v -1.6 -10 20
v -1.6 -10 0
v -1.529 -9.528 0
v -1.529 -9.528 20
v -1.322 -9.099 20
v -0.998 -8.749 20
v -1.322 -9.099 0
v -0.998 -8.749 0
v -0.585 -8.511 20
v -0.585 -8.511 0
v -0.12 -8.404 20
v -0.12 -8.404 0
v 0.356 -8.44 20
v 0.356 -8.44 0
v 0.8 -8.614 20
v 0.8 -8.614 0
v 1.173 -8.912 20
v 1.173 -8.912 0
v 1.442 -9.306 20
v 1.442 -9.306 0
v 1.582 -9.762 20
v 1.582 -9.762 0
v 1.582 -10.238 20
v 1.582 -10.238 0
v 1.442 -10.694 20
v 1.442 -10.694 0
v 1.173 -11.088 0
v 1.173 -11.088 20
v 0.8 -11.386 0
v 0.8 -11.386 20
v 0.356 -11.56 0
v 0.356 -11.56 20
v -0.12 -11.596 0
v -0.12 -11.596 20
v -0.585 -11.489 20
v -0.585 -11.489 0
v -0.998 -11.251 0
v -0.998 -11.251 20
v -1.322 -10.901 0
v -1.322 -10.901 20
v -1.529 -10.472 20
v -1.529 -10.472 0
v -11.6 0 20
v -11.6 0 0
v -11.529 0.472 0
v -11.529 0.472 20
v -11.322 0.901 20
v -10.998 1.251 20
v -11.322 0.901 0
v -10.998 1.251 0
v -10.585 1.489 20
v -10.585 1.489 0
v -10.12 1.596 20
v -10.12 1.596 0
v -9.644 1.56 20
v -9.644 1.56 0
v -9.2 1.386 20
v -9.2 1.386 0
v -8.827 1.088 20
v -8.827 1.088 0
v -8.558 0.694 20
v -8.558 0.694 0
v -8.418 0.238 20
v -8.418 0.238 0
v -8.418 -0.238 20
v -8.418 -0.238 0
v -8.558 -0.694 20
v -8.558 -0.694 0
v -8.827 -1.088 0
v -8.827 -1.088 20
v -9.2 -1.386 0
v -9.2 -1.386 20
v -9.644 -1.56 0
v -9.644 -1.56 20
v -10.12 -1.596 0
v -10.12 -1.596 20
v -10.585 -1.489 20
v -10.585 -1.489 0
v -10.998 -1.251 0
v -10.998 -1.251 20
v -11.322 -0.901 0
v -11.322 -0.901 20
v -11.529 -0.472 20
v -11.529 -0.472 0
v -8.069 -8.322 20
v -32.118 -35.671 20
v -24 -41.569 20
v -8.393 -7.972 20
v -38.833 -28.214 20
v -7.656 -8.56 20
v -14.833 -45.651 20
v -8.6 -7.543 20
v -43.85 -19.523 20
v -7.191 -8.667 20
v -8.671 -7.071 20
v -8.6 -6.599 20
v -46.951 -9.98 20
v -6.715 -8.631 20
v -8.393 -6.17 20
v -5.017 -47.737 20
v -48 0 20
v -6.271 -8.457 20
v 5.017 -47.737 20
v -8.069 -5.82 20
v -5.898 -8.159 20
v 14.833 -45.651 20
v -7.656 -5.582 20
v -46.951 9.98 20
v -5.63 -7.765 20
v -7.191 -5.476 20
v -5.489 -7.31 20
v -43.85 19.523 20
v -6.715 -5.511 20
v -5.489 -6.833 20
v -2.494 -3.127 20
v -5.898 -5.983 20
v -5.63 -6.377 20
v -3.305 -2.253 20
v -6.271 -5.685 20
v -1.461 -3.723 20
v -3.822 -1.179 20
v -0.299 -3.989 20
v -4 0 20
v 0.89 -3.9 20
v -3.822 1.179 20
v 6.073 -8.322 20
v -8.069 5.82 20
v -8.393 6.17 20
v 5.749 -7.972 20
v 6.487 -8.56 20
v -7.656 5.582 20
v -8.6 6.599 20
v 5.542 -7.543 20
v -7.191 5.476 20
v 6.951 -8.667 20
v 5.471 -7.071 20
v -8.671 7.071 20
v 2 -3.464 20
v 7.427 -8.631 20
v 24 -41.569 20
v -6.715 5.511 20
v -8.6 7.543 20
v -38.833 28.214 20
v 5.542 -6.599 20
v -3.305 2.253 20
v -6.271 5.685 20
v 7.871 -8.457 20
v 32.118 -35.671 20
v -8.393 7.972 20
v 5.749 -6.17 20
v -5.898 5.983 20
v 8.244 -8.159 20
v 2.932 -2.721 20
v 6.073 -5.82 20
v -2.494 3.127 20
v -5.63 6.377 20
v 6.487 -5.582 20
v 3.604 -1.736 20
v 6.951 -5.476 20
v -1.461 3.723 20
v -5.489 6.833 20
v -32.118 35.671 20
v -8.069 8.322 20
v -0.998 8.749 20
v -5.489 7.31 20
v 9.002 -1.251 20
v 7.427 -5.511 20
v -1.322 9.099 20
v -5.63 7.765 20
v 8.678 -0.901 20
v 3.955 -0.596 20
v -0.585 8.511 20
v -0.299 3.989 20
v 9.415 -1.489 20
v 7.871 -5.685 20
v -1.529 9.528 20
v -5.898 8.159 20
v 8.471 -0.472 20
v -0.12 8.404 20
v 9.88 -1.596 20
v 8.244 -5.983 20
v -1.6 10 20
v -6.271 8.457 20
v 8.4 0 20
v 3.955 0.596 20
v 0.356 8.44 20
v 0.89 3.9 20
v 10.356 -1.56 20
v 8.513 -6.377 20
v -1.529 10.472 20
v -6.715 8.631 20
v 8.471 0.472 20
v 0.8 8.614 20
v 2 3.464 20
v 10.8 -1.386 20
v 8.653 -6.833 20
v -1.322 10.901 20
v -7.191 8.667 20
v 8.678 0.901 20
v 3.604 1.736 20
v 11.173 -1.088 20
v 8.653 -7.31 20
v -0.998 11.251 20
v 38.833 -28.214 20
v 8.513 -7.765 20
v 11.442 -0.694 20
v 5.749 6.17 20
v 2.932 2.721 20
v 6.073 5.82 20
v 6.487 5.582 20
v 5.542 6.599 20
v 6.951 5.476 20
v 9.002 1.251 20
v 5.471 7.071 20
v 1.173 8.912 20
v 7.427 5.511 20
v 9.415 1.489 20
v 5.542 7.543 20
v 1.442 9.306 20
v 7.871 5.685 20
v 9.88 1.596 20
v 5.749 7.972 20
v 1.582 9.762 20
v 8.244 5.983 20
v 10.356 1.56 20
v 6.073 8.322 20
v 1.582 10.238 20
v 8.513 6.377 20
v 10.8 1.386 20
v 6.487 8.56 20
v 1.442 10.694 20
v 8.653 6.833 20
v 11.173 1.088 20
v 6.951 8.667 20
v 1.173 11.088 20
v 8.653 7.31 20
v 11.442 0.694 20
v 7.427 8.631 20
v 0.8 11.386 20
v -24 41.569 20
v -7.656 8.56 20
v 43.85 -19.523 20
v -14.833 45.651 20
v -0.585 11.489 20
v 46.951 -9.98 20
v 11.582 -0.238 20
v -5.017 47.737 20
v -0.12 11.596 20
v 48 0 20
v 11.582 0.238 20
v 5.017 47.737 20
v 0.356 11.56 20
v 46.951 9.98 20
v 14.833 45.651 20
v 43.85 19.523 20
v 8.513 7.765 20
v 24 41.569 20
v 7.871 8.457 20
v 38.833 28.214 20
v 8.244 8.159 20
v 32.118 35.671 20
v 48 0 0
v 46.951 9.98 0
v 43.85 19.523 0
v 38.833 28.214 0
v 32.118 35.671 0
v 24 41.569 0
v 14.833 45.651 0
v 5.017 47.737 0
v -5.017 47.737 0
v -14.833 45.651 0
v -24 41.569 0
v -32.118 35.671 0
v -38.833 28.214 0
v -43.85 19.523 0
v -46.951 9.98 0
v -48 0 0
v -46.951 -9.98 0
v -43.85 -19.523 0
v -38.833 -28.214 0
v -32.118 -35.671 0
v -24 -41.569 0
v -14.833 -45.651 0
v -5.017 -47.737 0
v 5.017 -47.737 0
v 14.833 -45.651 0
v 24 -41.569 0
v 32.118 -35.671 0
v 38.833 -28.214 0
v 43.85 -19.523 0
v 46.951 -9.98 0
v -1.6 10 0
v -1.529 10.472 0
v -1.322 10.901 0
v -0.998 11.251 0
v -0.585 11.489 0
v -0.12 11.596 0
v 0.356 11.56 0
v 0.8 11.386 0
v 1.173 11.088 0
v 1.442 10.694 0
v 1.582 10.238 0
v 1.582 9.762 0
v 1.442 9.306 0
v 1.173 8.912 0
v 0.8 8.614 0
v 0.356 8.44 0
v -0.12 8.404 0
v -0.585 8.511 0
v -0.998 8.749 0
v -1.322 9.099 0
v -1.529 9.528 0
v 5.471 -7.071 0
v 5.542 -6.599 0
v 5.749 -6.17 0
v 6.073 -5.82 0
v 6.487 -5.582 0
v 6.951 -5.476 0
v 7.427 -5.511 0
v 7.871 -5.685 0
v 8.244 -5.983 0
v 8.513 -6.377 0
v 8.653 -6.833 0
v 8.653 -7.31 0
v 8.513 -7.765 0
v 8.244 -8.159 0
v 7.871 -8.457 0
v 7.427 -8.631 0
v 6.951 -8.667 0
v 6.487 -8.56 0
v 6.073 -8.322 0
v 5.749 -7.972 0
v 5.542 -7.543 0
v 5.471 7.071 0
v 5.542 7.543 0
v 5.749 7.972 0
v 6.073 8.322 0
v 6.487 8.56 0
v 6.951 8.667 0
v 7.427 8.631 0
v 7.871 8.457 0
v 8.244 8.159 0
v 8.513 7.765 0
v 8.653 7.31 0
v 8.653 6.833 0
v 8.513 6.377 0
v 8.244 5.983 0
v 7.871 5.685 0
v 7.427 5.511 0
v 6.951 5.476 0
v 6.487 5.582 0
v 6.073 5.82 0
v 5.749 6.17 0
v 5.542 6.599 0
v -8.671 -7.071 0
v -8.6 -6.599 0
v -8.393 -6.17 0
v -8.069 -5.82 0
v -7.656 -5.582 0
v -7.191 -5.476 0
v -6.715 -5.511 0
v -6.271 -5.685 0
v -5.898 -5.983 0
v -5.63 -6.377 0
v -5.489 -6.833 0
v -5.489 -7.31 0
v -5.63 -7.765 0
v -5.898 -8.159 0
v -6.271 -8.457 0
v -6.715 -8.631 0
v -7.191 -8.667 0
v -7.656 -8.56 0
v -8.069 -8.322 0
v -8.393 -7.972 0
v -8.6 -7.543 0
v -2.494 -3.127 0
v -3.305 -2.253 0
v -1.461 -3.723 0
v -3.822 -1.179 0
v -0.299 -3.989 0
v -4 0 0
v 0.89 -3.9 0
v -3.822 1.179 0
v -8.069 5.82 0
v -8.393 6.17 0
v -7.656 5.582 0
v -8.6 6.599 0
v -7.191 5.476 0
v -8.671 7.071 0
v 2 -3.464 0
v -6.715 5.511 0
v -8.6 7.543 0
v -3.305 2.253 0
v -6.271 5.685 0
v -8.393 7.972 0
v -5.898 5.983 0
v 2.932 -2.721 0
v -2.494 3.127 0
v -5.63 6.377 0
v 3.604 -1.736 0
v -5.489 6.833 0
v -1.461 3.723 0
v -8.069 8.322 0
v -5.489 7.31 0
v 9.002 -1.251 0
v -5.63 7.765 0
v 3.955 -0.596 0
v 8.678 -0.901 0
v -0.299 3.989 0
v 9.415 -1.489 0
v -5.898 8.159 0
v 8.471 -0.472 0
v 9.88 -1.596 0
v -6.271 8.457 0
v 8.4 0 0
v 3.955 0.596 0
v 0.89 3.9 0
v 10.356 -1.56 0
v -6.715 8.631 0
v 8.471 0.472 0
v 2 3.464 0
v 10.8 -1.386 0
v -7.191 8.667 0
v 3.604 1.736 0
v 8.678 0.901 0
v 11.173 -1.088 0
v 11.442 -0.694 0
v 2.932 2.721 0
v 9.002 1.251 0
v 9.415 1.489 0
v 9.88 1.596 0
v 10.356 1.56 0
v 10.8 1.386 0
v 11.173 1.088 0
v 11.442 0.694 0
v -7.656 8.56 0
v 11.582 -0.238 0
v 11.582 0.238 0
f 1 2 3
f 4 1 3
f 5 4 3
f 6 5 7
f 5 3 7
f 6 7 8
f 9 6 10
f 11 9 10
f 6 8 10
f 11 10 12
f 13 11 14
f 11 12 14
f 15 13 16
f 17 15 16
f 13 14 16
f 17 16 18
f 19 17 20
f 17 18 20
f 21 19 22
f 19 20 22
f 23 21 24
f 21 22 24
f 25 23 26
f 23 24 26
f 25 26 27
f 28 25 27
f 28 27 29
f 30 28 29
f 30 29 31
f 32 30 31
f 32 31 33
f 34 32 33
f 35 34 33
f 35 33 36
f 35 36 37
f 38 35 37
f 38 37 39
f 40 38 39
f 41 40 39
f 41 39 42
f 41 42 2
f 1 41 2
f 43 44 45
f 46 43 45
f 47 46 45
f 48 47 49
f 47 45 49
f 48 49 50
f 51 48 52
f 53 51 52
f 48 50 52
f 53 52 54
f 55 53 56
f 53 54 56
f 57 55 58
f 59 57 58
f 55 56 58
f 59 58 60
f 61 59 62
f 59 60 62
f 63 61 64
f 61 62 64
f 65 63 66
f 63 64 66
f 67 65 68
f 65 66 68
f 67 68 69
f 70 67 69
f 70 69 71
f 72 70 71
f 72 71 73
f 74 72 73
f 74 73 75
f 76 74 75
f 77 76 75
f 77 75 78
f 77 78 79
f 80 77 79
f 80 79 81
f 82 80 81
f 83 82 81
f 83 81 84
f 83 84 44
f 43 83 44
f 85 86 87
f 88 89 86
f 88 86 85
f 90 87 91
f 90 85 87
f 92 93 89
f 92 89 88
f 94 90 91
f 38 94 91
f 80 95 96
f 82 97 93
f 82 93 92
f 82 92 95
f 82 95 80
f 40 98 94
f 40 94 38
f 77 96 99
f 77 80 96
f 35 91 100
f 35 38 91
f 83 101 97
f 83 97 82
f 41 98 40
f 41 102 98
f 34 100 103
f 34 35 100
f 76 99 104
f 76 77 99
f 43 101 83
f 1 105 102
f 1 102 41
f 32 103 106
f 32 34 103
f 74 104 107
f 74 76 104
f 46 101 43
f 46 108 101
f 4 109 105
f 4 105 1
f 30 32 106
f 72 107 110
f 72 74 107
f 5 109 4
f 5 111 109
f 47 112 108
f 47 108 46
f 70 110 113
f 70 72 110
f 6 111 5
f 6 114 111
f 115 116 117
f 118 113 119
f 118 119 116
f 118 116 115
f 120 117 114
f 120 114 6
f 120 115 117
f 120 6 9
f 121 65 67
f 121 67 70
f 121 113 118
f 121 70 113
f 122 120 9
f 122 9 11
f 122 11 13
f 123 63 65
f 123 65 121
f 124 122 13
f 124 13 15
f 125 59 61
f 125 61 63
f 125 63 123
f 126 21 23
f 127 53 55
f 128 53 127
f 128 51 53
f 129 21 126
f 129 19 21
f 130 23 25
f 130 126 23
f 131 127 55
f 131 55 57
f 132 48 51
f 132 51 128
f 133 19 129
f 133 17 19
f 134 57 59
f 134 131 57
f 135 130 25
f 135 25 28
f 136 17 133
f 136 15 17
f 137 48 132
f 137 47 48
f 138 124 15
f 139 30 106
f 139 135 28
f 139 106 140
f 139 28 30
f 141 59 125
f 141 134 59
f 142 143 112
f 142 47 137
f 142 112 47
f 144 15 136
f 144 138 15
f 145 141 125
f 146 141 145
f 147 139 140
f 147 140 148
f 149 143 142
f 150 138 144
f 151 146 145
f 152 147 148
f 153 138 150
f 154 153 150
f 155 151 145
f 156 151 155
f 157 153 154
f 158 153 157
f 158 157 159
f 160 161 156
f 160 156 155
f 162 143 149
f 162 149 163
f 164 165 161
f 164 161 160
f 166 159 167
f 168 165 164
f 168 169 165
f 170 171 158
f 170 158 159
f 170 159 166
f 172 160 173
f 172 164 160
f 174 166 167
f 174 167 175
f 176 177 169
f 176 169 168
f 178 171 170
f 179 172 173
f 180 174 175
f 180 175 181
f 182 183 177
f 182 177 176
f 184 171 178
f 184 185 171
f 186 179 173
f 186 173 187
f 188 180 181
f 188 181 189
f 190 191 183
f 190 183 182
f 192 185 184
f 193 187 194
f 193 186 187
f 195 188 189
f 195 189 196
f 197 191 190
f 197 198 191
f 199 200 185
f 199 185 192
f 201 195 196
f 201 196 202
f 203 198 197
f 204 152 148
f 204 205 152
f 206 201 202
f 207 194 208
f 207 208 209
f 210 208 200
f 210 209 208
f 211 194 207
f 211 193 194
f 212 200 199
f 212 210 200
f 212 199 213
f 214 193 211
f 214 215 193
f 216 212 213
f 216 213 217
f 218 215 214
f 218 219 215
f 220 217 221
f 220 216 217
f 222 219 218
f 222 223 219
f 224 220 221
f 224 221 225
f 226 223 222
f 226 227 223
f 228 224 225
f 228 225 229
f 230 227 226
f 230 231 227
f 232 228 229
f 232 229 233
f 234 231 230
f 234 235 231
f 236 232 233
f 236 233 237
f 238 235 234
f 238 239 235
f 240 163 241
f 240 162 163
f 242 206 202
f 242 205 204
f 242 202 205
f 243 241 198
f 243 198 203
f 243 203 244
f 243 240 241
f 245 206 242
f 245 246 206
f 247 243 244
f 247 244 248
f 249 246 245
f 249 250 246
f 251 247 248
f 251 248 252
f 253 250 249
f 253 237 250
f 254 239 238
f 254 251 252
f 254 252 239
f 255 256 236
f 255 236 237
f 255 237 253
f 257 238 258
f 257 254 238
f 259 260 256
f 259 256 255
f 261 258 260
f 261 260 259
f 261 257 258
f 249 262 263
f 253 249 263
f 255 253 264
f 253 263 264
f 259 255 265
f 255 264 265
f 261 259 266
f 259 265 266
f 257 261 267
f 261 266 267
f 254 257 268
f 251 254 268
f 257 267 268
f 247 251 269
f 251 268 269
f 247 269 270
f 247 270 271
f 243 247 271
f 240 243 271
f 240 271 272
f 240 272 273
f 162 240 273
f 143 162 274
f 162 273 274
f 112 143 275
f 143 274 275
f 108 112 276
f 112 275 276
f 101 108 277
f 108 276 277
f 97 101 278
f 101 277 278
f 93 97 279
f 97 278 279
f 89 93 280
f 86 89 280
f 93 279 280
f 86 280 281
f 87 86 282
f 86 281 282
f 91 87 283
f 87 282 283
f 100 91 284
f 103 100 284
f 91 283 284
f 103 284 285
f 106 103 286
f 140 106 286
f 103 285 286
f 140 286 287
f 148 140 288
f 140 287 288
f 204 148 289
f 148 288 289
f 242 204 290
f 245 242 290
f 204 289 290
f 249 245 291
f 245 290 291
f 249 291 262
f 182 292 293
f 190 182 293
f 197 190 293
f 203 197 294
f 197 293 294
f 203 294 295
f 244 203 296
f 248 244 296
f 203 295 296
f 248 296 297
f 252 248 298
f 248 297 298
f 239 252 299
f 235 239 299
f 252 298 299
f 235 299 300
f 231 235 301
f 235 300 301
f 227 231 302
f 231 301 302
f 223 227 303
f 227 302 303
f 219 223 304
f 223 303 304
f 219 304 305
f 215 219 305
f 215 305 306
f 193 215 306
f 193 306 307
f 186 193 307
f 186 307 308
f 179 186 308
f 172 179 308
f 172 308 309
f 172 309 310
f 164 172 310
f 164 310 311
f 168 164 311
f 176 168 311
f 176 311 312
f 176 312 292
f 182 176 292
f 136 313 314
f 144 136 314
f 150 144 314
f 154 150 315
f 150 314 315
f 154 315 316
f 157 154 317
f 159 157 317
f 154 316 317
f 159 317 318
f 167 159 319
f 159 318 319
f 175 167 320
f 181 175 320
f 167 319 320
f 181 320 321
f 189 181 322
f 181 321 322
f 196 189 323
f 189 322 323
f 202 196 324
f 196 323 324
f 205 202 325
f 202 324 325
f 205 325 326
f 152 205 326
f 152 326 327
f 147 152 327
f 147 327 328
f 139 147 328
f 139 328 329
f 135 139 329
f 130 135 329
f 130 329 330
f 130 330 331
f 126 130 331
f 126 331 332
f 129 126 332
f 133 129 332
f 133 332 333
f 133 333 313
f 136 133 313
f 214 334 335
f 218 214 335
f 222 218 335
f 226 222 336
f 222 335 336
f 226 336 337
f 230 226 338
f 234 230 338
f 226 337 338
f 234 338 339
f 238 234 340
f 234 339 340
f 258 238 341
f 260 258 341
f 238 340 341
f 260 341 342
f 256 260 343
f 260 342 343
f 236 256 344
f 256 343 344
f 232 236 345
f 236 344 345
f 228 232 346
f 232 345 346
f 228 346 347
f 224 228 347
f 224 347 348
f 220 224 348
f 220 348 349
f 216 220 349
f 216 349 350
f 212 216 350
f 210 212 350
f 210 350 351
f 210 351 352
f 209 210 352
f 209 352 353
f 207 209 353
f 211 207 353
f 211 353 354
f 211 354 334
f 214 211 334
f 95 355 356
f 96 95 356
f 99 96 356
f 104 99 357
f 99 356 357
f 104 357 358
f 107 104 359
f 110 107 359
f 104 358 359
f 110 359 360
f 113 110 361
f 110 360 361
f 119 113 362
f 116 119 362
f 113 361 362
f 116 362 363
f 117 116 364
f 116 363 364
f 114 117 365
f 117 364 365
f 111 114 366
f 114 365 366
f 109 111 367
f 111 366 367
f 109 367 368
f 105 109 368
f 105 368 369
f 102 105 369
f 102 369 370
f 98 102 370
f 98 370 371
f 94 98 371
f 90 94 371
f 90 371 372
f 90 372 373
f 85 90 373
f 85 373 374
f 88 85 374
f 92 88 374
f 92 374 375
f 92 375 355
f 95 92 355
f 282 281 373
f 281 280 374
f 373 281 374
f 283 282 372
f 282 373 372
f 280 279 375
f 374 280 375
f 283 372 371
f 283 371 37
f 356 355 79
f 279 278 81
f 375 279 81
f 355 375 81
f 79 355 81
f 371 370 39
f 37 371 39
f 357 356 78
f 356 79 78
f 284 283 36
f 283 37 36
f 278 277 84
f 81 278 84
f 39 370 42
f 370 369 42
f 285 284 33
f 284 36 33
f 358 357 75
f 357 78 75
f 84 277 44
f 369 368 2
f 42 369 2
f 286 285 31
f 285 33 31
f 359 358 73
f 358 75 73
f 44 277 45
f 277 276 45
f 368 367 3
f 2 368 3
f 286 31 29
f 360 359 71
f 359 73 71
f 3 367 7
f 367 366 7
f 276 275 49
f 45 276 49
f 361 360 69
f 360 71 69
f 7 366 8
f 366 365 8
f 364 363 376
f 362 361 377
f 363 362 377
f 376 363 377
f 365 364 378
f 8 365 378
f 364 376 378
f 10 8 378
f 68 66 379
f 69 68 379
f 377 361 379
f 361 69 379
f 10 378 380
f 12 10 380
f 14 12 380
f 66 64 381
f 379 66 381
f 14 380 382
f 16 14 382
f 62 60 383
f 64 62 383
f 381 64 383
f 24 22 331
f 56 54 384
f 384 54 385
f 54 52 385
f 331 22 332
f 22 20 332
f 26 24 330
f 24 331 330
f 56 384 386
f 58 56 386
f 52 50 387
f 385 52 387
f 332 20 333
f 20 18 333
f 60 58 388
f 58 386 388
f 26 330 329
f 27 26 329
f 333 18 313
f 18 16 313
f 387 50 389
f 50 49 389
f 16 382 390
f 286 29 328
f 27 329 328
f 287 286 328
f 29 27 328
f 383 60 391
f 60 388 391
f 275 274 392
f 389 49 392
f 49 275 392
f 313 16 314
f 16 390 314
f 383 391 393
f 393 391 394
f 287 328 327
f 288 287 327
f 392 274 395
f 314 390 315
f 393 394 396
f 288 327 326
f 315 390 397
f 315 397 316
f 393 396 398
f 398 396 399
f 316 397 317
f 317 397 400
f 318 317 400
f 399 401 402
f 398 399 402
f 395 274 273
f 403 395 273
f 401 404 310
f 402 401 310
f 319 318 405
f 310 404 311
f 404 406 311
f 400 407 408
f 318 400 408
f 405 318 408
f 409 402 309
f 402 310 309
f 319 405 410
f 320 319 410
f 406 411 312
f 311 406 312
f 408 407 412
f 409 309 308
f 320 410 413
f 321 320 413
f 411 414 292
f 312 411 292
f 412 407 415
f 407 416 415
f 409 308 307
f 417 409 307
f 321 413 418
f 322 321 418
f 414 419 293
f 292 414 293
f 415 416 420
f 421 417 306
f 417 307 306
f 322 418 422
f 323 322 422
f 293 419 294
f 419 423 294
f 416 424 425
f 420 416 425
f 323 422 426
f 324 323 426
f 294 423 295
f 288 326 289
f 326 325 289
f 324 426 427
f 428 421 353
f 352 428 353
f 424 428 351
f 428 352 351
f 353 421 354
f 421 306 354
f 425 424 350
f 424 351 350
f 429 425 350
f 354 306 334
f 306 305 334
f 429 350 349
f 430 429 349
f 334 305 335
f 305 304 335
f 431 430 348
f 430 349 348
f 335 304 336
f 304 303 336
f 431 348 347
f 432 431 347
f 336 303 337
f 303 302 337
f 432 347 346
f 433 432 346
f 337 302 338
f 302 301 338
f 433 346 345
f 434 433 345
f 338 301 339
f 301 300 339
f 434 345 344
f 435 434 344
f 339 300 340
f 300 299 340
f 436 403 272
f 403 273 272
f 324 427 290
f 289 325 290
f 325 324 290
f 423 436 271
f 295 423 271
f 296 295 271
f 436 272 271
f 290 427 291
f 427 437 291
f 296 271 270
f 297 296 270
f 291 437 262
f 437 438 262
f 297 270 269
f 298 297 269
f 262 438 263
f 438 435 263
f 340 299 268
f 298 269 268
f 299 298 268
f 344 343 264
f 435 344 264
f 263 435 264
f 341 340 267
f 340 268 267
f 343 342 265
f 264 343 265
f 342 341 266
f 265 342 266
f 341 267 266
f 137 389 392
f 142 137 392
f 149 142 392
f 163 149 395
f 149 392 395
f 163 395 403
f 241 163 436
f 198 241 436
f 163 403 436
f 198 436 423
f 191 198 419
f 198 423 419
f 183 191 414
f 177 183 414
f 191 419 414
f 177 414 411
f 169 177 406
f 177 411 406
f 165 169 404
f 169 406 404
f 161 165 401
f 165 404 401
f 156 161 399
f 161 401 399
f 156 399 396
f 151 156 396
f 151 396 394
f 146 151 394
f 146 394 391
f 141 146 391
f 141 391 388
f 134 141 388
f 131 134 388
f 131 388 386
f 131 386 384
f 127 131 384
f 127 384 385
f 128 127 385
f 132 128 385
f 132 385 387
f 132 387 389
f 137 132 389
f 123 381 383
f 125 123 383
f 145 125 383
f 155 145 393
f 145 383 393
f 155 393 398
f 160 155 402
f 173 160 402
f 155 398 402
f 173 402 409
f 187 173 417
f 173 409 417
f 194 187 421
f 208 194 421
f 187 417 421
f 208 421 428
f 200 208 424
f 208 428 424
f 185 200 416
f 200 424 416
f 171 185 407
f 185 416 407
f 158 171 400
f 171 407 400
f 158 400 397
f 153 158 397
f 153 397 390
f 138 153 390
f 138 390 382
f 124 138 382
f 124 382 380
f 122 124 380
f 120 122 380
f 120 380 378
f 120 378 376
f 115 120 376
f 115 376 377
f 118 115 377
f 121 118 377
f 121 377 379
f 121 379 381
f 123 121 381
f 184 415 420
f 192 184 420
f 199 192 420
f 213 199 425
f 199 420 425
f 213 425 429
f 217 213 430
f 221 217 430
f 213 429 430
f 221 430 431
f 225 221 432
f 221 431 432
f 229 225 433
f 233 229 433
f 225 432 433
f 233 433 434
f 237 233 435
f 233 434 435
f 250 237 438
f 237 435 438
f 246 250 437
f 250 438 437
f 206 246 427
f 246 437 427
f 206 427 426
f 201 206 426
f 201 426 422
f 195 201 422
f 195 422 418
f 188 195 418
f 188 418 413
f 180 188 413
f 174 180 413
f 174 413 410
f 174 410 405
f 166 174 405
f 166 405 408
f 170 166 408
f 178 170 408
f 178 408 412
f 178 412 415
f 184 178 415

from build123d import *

# Parameters (mm, degrees)
SKETCH1_R           = 48
BOSS_EXTRUDE1_DEPTH = 20
CUT_EXTRUDE1_REACH  = 72.767
SKETCH2_R           = 4
SKETCH2_R_2         = 1.6


with BuildPart() as part:
    # Sketch1 → Boss-Extrude1 (new body)
    with BuildSketch(Plane.XY):
        Circle(SKETCH1_R)
    extrude(amount=BOSS_EXTRUDE1_DEPTH)

    # Sketch2 → Cut-Extrude1 (cut, up to next)
    with BuildSketch(Plane(origin=(0, 0, 0), x_dir=(-1, 0, 0), z_dir=(0, 0, -1)), mode=Mode.PRIVATE) as cut_extrude1_sk1:
        Circle(SKETCH2_R)
    cut_extrude1_tool1 = extrude(cut_extrude1_sk1.sketch, amount=-CUT_EXTRUDE1_REACH, mode=Mode.PRIVATE) & part.part
    # Sketch2 → Cut-Extrude1 (cut, up to next)
    with BuildSketch(Plane(origin=(0, 0, 0), x_dir=(-1, 0, 0), z_dir=(0, 0, -1)), mode=Mode.PRIVATE) as cut_extrude1_sk2:
        with Locations((0, 10)):
            Circle(SKETCH2_R_2)
    cut_extrude1_tool2 = extrude(cut_extrude1_sk2.sketch, amount=-CUT_EXTRUDE1_REACH, mode=Mode.PRIVATE) & part.part
    # Sketch2 → Cut-Extrude1 (cut, up to next)
    with BuildSketch(Plane(origin=(0, 0, 0), x_dir=(-1, 0, 0), z_dir=(0, 0, -1)), mode=Mode.PRIVATE) as cut_extrude1_sk3:
        with Locations((7.071067812, 7.071067812)):
            Circle(SKETCH2_R_2)
    cut_extrude1_tool3 = extrude(cut_extrude1_sk3.sketch, amount=-CUT_EXTRUDE1_REACH, mode=Mode.PRIVATE) & part.part
    # Sketch2 → Cut-Extrude1 (cut, up to next)
    with BuildSketch(Plane(origin=(0, 0, 0), x_dir=(-1, 0, 0), z_dir=(0, 0, -1)), mode=Mode.PRIVATE) as cut_extrude1_sk4:
        with Locations((10, 0)):
            Circle(SKETCH2_R_2)
    cut_extrude1_tool4 = extrude(cut_extrude1_sk4.sketch, amount=-CUT_EXTRUDE1_REACH, mode=Mode.PRIVATE) & part.part
    # Sketch2 → Cut-Extrude1 (cut, up to next)
    with BuildSketch(Plane(origin=(0, 0, 0), x_dir=(-1, 0, 0), z_dir=(0, 0, -1)), mode=Mode.PRIVATE) as cut_extrude1_sk5:
        with Locations((7.071067812, -7.071067812)):
            Circle(SKETCH2_R_2)
    cut_extrude1_tool5 = extrude(cut_extrude1_sk5.sketch, amount=-CUT_EXTRUDE1_REACH, mode=Mode.PRIVATE) & part.part
    # Sketch2 → Cut-Extrude1 (cut, up to next)
    with BuildSketch(Plane(origin=(0, 0, 0), x_dir=(-1, 0, 0), z_dir=(0, 0, -1)), mode=Mode.PRIVATE) as cut_extrude1_sk6:
        with Locations((0, -10)):
            Circle(SKETCH2_R_2)
    cut_extrude1_tool6 = extrude(cut_extrude1_sk6.sketch, amount=-CUT_EXTRUDE1_REACH, mode=Mode.PRIVATE) & part.part
    # Sketch2 → Cut-Extrude1 (cut, up to next)
    with BuildSketch(Plane(origin=(0, 0, 0), x_dir=(-1, 0, 0), z_dir=(0, 0, -1)), mode=Mode.PRIVATE) as cut_extrude1_sk7:
        with Locations((-7.071067812, -7.071067812)):
            Circle(SKETCH2_R_2)
    cut_extrude1_tool7 = extrude(cut_extrude1_sk7.sketch, amount=-CUT_EXTRUDE1_REACH, mode=Mode.PRIVATE) & part.part
    # Sketch2 → Cut-Extrude1 (cut, up to next)
    with BuildSketch(Plane(origin=(0, 0, 0), x_dir=(-1, 0, 0), z_dir=(0, 0, -1)), mode=Mode.PRIVATE) as cut_extrude1_sk8:
        with Locations((-10, 0)):
            Circle(SKETCH2_R_2)
    cut_extrude1_tool8 = extrude(cut_extrude1_sk8.sketch, amount=-CUT_EXTRUDE1_REACH, mode=Mode.PRIVATE) & part.part
    # Sketch2 → Cut-Extrude1 (cut, up to next)
    with BuildSketch(Plane(origin=(0, 0, 0), x_dir=(-1, 0, 0), z_dir=(0, 0, -1)), mode=Mode.PRIVATE) as cut_extrude1_sk9:
        with Locations((-7.071067812, 7.071067812)):
            Circle(SKETCH2_R_2)
    cut_extrude1_tool9 = extrude(cut_extrude1_sk9.sketch, amount=-CUT_EXTRUDE1_REACH, mode=Mode.PRIVATE) & part.part
    add(cut_extrude1_tool1.solids().sort_by_distance((0, 0, 0))[0], mode=Mode.SUBTRACT)
    add(cut_extrude1_tool2.solids().sort_by_distance((0, 10, 0))[0], mode=Mode.SUBTRACT)
    add(cut_extrude1_tool3.solids().sort_by_distance((-7.071068, 7.071068, 0))[0], mode=Mode.SUBTRACT)
    add(cut_extrude1_tool4.solids().sort_by_distance((-10, 0, 0))[0], mode=Mode.SUBTRACT)
    add(cut_extrude1_tool5.solids().sort_by_distance((-7.071068, -7.071068, 0))[0], mode=Mode.SUBTRACT)
    add(cut_extrude1_tool6.solids().sort_by_distance((0, -10, 0))[0], mode=Mode.SUBTRACT)
    add(cut_extrude1_tool7.solids().sort_by_distance((7.071068, -7.071068, 0))[0], mode=Mode.SUBTRACT)
    add(cut_extrude1_tool8.solids().sort_by_distance((10, 0, 0))[0], mode=Mode.SUBTRACT)
    add(cut_extrude1_tool9.solids().sort_by_distance((7.071068, 7.071068, 0))[0], mode=Mode.SUBTRACT)


solid = part.part
